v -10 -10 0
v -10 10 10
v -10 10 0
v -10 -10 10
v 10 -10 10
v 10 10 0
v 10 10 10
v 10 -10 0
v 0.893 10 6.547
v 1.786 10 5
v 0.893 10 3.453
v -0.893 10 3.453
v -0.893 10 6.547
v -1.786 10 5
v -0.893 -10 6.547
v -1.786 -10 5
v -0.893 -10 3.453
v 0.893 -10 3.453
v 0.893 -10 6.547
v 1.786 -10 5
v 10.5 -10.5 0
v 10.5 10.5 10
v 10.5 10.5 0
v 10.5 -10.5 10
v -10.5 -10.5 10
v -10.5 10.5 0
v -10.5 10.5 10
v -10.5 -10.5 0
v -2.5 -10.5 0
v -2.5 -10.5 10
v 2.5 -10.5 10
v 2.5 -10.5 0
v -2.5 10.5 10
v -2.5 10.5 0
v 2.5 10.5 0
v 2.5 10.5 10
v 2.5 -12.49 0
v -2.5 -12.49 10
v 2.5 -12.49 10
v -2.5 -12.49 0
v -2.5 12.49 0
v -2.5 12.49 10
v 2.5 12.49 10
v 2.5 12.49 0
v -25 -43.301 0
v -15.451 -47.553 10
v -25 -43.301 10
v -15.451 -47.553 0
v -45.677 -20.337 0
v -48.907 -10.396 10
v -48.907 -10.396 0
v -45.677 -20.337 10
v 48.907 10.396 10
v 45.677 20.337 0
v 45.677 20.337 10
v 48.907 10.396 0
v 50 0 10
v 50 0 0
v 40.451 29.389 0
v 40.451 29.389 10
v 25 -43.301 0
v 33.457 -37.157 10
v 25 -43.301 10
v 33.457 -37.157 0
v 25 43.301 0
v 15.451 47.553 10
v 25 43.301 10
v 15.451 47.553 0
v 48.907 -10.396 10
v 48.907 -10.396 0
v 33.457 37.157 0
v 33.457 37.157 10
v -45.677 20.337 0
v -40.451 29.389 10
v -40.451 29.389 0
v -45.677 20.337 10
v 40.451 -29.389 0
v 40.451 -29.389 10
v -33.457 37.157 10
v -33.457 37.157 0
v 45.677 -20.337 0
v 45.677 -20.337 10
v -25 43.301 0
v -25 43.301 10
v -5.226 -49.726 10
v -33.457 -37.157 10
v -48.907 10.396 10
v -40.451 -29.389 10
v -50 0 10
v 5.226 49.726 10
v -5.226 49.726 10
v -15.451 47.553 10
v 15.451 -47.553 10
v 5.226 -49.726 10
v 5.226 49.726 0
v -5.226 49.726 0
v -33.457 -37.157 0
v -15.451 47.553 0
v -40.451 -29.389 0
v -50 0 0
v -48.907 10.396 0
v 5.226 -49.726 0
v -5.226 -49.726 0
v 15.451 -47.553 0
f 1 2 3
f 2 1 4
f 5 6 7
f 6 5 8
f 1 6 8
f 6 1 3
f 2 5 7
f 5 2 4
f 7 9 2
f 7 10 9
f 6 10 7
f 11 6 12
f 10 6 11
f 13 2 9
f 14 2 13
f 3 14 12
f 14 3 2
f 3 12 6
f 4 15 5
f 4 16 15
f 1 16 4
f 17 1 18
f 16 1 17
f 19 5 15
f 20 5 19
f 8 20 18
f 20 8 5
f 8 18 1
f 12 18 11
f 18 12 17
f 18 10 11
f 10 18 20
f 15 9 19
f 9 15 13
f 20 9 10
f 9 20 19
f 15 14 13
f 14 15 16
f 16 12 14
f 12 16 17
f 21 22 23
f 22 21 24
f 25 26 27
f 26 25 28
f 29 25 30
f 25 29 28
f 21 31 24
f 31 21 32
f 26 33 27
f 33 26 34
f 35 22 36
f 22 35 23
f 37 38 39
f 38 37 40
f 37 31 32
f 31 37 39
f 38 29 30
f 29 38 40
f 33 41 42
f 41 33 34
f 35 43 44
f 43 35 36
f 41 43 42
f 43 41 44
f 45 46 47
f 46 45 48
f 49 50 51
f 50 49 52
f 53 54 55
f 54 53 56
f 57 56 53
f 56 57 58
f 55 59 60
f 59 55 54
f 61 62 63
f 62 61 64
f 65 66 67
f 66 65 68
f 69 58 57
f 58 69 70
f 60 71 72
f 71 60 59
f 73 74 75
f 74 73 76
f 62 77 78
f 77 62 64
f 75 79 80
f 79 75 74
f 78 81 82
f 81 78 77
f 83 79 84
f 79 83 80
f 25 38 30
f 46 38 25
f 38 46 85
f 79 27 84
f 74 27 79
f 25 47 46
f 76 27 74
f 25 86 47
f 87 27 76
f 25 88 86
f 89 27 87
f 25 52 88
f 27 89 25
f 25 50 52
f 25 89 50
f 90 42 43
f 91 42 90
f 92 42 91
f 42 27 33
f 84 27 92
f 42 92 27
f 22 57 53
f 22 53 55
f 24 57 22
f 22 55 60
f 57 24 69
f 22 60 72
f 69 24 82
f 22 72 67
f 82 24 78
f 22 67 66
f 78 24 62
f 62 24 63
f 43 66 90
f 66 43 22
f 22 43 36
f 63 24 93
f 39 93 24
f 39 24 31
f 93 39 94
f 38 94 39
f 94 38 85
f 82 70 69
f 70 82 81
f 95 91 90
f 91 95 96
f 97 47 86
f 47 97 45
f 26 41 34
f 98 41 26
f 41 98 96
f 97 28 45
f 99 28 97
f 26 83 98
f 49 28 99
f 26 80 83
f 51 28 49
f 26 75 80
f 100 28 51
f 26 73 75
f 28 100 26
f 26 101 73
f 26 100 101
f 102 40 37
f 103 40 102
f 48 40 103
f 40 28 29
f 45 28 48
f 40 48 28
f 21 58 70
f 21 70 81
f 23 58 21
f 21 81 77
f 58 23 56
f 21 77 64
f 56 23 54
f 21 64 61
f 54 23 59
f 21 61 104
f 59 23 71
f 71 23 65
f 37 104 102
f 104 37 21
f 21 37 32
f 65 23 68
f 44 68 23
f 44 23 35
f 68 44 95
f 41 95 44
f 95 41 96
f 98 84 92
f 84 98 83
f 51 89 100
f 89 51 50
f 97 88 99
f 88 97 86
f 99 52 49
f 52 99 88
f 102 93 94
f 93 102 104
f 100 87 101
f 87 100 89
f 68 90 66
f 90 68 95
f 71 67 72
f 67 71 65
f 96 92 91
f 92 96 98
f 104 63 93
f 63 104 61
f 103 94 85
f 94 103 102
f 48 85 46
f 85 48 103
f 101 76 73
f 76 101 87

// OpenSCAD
// file: ../lib/common.scad
// Common modules for use across models

epsilon=0.02;

module hollow_cylinder(h,d_inner,d_outer) {
  difference() {
    cylinder(h=h,d=d_outer);
    translate([0,0,-epsilon/2]) {
      cylinder(h=h+epsilon, d=d_inner);
    }
  }
}

module hollow_prism(h, lx_outer, lx_inner, ly_outer, ly_inner) {
  difference() {
    cube([lx_outer, ly_outer, h]);
    translate([(lx_outer-lx_inner)/2,(ly_outer-ly_inner)/2,-epsilon/2]) {
      cube([lx_inner, ly_inner,h+epsilon]);
    }
  }
}

module right_triangle(lx, ly) {
  polygon(points=[[0,0],
                  [lx,0],
                  [0,ly],
                  [0,0]]);
}

// A 2D rectangle with rounded corners
module rounded_rectangle(width, height, radius) {
  r = radius;
  x1 = r;
  y1 = r;
  x2 = width - r;
  y2 = height - r;
  hull() {
    translate([x1, y1, 0]) circle(radius);
    translate([x2, y1, 0]) circle(radius);
    translate([x1, y2, 0]) circle(radius);
    translate([x2, y2, 0]) circle(radius);
  }
}

// 3D rectangle with cylindrical rounded corners. Scale gives an optional flare to the top.
module rounded_prism(width, length, height, radius, scale=1) {
  translate([width/2, length/2]) {
    linear_extrude(height=height, scale=scale) {
      translate([-width/2, -length/2]) {
        rounded_rectangle(width, length, radius);
      }
    }
  }
}

// A squished sphere with the specified radii
module squashed_sphere(h_radius, v_radius) {
  resize([h_radius*2, h_radius*2, v_radius*2]) {
    sphere(r=h_radius);
  }
}

// 3D rectangle with spherical rounded corners
module pillowed_prism(width, length, height, h_radius, v_radius) {
  x1 = h_radius;
  y1 = x1;
  x2 = width - h_radius;
  y2 = length - h_radius;
  hull() {
    translate([x1, y1,  height/2-v_radius]) squashed_sphere(h_radius, v_radius);
    translate([x2, y1,  height/2-v_radius]) squashed_sphere(h_radius, v_radius);
    translate([x1, y2,  height/2-v_radius]) squashed_sphere(h_radius, v_radius);
    translate([x2, y2,  height/2-v_radius]) squashed_sphere(h_radius, v_radius);
    translate([x1, y1, -height/2+v_radius]) squashed_sphere(h_radius, v_radius);
    translate([x2, y1, -height/2+v_radius]) squashed_sphere(h_radius, v_radius);
    translate([x1, y2, -height/2+v_radius]) squashed_sphere(h_radius, v_radius);
    translate([x2, y2, -height/2+v_radius]) squashed_sphere(h_radius, v_radius);
  }
}

// Returns a volume that contains all of the points above or below the
// specified z
module xy(above, below)
{
  d = 10000;
  if (below == undef)
    translate([0,0,above+d/2]) cube([d,d,d] ,center=true);
  else
    translate([0,0,below-d/2]) cube([d,d,d], center=true);
}

// Lays things out in a line with labels
// TODO: Lay them out in a grid instead
module display(w, l=10, padding=2) {
  for (n = [0:2:$children-1]) {
    translate([(w + padding) * n/2, 0, 0]) {
      translate([0, l, 0]) {
        children(n+1);
      }
      color([0,0,0])
        children(n);
    }
  }
}

module quarter_cylinder(r, h) {
  difference() {
    translate([0,0,h/2]) {
      cylinder(r=r, h=h, center=true);
    }
    translate([-r*2-epsilon,-r*2,-epsilon]) {
      cube([r*2,r*4,h*2]);
    }
    translate([-r*2-epsilon,-r*2,-epsilon]) {
      cube([r*4,r*2,h*2]);
    }

  }
}

function bit_test(val, bit) = floor(val / (pow(2,bit))) % 2;

function inches(in) = in * 25.4;

// Concatenate two vectors. TODO: Make it work with N vectors. Here's
// what it looks like with three:
// function cat(L1, L2, L3) = [for(L=[L1, L2, L3], a=L) a];
function cat(L1, L2) = [for(L=[L1, L2], a=L) a];
// file: ../lib/square_nut.scad
include <common.scad>;

module square_nut(length = 10,
                  width = 10,
                  height = 10,
                  pin_d = 0,
                  pin_head_dia = 6,
                  pin_head_depth = 4,
                  bore_d = 0) { 
  rotate([90,0,0]) {
    difference() {
      rotate([90, 0, 0]) {
        union() {
          cube([length, width, height], center=true);
        }
      }
      // bore
      rotate([90,0,0]) {
        translate([0,0,-1]) {
          cylinder(h=height + 10, d = bore_d, center = true);
        }
      }
      // pin bore
      translate([0, 0, -1]) {
        cylinder(h=width + 4, d = pin_d, center=true);
      }
      // pin head
      translate([0, 0, (pin_head_depth-length)/2 - 0.01]) {
        cylinder(h=pin_head_depth, d = pin_head_dia, center=true);
      }
    }
  }
}

module with_square_nut(size, thickness, gap_w = 0.5, notch_w = 5, notch_d = 2, bore_d = 0, pin_head_dia = 0, pin_head_depth = 0, pin_d = inches(9/64)) {
  union() {
    translate([0,0,thickness/2]) {
      square_nut(length = size,
                 width = size,
                 height = thickness,
                 pin_d = pin_d,
                 pin_head_dia = pin_head_dia,
                 pin_head_depth = pin_head_depth,
                 bore_d = bore_d
        );
    }
    difference() {
      children();
      translate([0,0,(thickness/2)-1]) {
        square_nut(length=size + gap_w * 2,
                   width=size + gap_w * 2,
                   height=thickness + 4,
                   pin_d = 0,
                   pin_head_dia = 0,
                   pin_head_depth = 0
          );
      }
      for (angle = [-90, 90]) {
        rotate([0,0,angle]) {
          translate([size/2 + gap_w + notch_d/2 - 0.01, 0, thickness / 2 ]) {
            cube([notch_d, notch_w, thickness + 2], center = true);
          }
        }
      }
    }
  }
}
// main file
include <../lib/square_nut.scad>;

with_square_nut(20, 10) {
  cylinder(h = 10, r = 50);
}
